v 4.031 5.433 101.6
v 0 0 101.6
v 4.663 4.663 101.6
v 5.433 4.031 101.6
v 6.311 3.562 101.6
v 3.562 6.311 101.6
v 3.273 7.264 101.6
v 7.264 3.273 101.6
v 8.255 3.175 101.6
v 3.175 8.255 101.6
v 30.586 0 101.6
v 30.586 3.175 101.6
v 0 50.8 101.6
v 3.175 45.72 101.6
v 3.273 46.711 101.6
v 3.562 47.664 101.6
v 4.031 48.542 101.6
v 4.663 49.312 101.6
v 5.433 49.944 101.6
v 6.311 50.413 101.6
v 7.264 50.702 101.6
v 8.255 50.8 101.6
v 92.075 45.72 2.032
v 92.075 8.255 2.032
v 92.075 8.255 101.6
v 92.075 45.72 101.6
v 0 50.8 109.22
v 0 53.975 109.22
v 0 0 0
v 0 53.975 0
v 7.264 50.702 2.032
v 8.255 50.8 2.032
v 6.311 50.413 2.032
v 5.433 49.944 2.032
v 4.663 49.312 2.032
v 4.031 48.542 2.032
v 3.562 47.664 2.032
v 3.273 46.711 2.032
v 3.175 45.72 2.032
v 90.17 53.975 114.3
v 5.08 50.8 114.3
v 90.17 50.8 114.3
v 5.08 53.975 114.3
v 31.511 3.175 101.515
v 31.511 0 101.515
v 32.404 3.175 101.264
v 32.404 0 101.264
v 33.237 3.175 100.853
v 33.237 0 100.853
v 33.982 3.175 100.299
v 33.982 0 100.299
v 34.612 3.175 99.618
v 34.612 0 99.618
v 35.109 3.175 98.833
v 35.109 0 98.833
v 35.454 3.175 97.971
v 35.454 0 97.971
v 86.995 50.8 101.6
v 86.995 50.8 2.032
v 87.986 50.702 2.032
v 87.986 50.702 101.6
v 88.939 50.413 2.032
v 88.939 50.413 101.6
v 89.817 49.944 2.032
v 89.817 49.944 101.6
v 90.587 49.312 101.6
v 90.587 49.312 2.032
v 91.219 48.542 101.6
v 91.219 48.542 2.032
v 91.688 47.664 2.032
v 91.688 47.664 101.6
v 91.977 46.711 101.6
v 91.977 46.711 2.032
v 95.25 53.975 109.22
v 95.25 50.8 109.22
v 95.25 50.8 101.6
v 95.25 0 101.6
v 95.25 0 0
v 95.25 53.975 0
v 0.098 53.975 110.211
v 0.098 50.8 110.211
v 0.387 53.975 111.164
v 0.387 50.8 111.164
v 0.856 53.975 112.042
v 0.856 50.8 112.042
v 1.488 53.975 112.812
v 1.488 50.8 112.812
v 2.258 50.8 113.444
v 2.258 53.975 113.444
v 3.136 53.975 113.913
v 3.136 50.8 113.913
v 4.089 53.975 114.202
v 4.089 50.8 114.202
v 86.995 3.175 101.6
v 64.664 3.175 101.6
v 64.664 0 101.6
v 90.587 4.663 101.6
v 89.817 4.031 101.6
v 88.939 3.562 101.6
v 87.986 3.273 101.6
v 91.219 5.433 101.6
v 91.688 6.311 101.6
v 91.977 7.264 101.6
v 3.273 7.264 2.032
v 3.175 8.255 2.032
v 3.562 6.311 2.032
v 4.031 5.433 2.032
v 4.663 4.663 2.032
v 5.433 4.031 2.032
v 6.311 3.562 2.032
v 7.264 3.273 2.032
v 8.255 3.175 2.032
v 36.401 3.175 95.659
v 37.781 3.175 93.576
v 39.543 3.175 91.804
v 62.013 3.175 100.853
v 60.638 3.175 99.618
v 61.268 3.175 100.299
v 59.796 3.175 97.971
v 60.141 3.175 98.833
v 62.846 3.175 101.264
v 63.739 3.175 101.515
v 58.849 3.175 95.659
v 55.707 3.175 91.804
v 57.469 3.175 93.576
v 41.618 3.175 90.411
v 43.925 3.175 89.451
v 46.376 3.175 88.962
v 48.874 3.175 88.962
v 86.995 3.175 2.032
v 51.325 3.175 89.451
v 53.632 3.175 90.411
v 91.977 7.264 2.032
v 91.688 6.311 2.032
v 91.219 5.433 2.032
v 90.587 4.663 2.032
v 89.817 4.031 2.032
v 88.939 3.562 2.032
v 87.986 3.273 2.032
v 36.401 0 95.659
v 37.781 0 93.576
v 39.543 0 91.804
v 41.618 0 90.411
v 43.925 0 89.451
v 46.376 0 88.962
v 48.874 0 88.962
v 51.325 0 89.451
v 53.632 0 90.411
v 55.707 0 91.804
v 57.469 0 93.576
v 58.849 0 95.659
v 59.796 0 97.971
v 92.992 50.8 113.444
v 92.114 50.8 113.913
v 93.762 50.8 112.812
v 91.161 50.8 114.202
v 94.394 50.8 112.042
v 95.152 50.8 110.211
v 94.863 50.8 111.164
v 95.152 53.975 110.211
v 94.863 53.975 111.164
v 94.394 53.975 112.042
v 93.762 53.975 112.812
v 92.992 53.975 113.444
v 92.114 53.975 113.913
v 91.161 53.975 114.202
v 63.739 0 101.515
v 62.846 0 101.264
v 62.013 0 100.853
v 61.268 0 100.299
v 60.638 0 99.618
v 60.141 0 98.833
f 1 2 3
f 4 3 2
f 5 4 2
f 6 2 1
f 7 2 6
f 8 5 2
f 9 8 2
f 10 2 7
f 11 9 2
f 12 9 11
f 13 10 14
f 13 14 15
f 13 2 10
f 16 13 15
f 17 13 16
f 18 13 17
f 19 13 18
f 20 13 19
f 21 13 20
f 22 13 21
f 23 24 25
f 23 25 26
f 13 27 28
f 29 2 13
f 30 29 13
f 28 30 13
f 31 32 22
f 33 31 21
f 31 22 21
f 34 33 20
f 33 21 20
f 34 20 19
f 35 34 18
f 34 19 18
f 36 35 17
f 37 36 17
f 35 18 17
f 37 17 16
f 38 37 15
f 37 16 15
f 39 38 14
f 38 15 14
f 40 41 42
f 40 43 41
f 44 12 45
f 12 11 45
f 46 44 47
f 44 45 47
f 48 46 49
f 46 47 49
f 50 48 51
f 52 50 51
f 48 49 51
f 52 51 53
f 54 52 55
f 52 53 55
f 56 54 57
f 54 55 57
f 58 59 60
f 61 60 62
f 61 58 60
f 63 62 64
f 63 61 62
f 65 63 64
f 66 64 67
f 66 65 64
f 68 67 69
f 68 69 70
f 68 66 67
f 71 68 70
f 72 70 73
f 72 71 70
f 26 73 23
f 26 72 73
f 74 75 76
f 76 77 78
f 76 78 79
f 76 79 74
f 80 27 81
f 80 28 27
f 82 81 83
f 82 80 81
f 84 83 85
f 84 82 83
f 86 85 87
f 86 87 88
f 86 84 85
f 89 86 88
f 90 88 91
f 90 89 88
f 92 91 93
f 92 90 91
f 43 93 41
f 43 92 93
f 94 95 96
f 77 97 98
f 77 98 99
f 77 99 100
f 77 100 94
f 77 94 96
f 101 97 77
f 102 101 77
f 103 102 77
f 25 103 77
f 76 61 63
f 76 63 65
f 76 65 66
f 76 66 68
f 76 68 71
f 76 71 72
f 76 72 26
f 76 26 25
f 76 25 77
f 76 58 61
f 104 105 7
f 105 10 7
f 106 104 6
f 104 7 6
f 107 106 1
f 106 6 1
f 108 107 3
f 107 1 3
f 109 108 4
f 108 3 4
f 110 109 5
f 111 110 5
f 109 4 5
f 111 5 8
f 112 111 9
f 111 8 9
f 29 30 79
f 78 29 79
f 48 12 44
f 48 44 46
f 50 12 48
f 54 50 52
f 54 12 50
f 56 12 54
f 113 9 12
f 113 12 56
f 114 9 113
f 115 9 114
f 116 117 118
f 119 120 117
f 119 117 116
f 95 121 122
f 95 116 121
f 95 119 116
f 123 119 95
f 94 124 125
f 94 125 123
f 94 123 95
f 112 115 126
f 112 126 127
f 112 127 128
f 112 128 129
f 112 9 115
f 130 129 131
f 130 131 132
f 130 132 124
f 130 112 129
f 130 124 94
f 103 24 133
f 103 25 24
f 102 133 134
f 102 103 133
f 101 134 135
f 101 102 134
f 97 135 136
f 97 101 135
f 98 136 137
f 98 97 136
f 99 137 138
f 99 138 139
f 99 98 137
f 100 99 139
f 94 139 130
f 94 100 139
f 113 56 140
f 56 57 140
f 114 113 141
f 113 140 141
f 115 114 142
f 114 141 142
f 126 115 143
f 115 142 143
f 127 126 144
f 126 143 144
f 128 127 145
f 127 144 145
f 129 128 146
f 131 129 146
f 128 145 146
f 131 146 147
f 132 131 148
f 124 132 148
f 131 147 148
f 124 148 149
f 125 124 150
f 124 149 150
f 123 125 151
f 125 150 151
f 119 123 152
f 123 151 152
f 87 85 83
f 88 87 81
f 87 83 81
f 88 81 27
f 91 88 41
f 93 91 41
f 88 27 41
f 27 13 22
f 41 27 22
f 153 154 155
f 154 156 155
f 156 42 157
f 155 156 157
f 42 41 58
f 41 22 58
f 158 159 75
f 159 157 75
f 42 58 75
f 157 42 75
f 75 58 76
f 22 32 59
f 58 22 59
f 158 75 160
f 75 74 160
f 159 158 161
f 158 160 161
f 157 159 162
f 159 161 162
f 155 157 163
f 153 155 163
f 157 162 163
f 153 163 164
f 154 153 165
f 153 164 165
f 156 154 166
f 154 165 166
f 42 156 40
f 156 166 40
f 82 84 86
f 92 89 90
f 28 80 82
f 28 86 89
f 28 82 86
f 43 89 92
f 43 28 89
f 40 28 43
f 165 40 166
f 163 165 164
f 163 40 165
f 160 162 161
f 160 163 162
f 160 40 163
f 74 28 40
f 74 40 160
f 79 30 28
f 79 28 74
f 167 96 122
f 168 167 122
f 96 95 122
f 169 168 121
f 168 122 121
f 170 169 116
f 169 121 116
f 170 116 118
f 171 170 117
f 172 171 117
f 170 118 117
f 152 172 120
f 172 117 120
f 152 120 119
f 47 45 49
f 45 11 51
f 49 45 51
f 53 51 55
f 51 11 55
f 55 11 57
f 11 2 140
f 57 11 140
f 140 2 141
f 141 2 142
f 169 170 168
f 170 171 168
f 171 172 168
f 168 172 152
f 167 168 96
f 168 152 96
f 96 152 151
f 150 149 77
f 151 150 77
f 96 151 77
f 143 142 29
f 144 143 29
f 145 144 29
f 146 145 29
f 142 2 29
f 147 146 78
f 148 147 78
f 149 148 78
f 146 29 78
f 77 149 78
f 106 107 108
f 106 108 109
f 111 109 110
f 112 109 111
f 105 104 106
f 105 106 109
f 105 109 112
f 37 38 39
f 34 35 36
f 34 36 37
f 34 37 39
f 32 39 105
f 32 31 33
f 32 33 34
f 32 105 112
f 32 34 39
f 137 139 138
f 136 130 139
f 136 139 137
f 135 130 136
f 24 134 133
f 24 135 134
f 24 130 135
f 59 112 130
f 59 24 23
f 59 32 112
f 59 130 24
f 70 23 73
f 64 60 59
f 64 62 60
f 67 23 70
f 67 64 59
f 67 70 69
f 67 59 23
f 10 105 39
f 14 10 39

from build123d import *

# Parameters (mm, degrees)
F0_W     = 95.25
F0_H     = 53.975
F1_DEPTH = 2.032
F2_W     = 95.25
F2_H     = 53.975
F2_W_2   = 88.9
F2_H_2   = 47.625
F3_DEPTH = 99.568
F4_W     = 95.25
F4_H     = 3.175
F5_DEPTH = 12.7
F6_R     = 5.08
F7_R     = 5.08
F8_R     = 12.7
F9_DEPTH = 6.35
F10_R    = 5.08


with BuildPart() as f1:
    # F0 (on Top) → F1 (new body)
    with BuildSketch(Plane.XY):
        with Locations((47.625, 26.9875)):
            Rectangle(F0_W, F0_H)
    extrude(amount=F1_DEPTH)

    # F2 (on face) → F3 (join)
    with BuildSketch(Plane.XY.offset(2.032)):
        with Locations((47.625, 26.9875)):
            Rectangle(F2_W, F2_H)
        with Locations((47.625, 26.9875)):
            Rectangle(F2_W_2, F2_H_2, mode=Mode.SUBTRACT)
    extrude(amount=F3_DEPTH)

    # F4 (on face) → F5 (join)
    with BuildSketch(Plane.XY.offset(101.6)):
        with Locations((47.625, 52.3875)):
            Rectangle(F4_W, F4_H)
    extrude(amount=F5_DEPTH)

    # F6
    f6_edges = [f1.edges().sort_by_distance(p)[0] for p in [
        (0, 52.3875, 114.3),
        (95.25, 52.3875, 114.3),
    ]]
    fillet(f6_edges, radius=F6_R)

    # F7
    f7_edges = [f1.edges().sort_by_distance(p)[0] for p in [
        (92.075, 50.8, 51.816),
        (3.175, 50.8, 51.816),
        (3.175, 3.175, 51.816),
        (92.075, 3.175, 51.816),
    ]]
    fillet(f7_edges, radius=F7_R)

    # F8 (on face) → F9 (cut)
    with BuildSketch(Plane.XZ):
        with Locations((47.625, 101.6)):
            Circle(F8_R)
    extrude(amount=-F9_DEPTH, mode=Mode.SUBTRACT)

    # F10
    f10_edges = [f1.edges().sort_by_distance(p)[0] for p in [
        (60.325, 1.5875, 101.6),
        (34.925, 1.5875, 101.6),
    ]]
    fillet(f10_edges, radius=F10_R)


solid = f1.part
